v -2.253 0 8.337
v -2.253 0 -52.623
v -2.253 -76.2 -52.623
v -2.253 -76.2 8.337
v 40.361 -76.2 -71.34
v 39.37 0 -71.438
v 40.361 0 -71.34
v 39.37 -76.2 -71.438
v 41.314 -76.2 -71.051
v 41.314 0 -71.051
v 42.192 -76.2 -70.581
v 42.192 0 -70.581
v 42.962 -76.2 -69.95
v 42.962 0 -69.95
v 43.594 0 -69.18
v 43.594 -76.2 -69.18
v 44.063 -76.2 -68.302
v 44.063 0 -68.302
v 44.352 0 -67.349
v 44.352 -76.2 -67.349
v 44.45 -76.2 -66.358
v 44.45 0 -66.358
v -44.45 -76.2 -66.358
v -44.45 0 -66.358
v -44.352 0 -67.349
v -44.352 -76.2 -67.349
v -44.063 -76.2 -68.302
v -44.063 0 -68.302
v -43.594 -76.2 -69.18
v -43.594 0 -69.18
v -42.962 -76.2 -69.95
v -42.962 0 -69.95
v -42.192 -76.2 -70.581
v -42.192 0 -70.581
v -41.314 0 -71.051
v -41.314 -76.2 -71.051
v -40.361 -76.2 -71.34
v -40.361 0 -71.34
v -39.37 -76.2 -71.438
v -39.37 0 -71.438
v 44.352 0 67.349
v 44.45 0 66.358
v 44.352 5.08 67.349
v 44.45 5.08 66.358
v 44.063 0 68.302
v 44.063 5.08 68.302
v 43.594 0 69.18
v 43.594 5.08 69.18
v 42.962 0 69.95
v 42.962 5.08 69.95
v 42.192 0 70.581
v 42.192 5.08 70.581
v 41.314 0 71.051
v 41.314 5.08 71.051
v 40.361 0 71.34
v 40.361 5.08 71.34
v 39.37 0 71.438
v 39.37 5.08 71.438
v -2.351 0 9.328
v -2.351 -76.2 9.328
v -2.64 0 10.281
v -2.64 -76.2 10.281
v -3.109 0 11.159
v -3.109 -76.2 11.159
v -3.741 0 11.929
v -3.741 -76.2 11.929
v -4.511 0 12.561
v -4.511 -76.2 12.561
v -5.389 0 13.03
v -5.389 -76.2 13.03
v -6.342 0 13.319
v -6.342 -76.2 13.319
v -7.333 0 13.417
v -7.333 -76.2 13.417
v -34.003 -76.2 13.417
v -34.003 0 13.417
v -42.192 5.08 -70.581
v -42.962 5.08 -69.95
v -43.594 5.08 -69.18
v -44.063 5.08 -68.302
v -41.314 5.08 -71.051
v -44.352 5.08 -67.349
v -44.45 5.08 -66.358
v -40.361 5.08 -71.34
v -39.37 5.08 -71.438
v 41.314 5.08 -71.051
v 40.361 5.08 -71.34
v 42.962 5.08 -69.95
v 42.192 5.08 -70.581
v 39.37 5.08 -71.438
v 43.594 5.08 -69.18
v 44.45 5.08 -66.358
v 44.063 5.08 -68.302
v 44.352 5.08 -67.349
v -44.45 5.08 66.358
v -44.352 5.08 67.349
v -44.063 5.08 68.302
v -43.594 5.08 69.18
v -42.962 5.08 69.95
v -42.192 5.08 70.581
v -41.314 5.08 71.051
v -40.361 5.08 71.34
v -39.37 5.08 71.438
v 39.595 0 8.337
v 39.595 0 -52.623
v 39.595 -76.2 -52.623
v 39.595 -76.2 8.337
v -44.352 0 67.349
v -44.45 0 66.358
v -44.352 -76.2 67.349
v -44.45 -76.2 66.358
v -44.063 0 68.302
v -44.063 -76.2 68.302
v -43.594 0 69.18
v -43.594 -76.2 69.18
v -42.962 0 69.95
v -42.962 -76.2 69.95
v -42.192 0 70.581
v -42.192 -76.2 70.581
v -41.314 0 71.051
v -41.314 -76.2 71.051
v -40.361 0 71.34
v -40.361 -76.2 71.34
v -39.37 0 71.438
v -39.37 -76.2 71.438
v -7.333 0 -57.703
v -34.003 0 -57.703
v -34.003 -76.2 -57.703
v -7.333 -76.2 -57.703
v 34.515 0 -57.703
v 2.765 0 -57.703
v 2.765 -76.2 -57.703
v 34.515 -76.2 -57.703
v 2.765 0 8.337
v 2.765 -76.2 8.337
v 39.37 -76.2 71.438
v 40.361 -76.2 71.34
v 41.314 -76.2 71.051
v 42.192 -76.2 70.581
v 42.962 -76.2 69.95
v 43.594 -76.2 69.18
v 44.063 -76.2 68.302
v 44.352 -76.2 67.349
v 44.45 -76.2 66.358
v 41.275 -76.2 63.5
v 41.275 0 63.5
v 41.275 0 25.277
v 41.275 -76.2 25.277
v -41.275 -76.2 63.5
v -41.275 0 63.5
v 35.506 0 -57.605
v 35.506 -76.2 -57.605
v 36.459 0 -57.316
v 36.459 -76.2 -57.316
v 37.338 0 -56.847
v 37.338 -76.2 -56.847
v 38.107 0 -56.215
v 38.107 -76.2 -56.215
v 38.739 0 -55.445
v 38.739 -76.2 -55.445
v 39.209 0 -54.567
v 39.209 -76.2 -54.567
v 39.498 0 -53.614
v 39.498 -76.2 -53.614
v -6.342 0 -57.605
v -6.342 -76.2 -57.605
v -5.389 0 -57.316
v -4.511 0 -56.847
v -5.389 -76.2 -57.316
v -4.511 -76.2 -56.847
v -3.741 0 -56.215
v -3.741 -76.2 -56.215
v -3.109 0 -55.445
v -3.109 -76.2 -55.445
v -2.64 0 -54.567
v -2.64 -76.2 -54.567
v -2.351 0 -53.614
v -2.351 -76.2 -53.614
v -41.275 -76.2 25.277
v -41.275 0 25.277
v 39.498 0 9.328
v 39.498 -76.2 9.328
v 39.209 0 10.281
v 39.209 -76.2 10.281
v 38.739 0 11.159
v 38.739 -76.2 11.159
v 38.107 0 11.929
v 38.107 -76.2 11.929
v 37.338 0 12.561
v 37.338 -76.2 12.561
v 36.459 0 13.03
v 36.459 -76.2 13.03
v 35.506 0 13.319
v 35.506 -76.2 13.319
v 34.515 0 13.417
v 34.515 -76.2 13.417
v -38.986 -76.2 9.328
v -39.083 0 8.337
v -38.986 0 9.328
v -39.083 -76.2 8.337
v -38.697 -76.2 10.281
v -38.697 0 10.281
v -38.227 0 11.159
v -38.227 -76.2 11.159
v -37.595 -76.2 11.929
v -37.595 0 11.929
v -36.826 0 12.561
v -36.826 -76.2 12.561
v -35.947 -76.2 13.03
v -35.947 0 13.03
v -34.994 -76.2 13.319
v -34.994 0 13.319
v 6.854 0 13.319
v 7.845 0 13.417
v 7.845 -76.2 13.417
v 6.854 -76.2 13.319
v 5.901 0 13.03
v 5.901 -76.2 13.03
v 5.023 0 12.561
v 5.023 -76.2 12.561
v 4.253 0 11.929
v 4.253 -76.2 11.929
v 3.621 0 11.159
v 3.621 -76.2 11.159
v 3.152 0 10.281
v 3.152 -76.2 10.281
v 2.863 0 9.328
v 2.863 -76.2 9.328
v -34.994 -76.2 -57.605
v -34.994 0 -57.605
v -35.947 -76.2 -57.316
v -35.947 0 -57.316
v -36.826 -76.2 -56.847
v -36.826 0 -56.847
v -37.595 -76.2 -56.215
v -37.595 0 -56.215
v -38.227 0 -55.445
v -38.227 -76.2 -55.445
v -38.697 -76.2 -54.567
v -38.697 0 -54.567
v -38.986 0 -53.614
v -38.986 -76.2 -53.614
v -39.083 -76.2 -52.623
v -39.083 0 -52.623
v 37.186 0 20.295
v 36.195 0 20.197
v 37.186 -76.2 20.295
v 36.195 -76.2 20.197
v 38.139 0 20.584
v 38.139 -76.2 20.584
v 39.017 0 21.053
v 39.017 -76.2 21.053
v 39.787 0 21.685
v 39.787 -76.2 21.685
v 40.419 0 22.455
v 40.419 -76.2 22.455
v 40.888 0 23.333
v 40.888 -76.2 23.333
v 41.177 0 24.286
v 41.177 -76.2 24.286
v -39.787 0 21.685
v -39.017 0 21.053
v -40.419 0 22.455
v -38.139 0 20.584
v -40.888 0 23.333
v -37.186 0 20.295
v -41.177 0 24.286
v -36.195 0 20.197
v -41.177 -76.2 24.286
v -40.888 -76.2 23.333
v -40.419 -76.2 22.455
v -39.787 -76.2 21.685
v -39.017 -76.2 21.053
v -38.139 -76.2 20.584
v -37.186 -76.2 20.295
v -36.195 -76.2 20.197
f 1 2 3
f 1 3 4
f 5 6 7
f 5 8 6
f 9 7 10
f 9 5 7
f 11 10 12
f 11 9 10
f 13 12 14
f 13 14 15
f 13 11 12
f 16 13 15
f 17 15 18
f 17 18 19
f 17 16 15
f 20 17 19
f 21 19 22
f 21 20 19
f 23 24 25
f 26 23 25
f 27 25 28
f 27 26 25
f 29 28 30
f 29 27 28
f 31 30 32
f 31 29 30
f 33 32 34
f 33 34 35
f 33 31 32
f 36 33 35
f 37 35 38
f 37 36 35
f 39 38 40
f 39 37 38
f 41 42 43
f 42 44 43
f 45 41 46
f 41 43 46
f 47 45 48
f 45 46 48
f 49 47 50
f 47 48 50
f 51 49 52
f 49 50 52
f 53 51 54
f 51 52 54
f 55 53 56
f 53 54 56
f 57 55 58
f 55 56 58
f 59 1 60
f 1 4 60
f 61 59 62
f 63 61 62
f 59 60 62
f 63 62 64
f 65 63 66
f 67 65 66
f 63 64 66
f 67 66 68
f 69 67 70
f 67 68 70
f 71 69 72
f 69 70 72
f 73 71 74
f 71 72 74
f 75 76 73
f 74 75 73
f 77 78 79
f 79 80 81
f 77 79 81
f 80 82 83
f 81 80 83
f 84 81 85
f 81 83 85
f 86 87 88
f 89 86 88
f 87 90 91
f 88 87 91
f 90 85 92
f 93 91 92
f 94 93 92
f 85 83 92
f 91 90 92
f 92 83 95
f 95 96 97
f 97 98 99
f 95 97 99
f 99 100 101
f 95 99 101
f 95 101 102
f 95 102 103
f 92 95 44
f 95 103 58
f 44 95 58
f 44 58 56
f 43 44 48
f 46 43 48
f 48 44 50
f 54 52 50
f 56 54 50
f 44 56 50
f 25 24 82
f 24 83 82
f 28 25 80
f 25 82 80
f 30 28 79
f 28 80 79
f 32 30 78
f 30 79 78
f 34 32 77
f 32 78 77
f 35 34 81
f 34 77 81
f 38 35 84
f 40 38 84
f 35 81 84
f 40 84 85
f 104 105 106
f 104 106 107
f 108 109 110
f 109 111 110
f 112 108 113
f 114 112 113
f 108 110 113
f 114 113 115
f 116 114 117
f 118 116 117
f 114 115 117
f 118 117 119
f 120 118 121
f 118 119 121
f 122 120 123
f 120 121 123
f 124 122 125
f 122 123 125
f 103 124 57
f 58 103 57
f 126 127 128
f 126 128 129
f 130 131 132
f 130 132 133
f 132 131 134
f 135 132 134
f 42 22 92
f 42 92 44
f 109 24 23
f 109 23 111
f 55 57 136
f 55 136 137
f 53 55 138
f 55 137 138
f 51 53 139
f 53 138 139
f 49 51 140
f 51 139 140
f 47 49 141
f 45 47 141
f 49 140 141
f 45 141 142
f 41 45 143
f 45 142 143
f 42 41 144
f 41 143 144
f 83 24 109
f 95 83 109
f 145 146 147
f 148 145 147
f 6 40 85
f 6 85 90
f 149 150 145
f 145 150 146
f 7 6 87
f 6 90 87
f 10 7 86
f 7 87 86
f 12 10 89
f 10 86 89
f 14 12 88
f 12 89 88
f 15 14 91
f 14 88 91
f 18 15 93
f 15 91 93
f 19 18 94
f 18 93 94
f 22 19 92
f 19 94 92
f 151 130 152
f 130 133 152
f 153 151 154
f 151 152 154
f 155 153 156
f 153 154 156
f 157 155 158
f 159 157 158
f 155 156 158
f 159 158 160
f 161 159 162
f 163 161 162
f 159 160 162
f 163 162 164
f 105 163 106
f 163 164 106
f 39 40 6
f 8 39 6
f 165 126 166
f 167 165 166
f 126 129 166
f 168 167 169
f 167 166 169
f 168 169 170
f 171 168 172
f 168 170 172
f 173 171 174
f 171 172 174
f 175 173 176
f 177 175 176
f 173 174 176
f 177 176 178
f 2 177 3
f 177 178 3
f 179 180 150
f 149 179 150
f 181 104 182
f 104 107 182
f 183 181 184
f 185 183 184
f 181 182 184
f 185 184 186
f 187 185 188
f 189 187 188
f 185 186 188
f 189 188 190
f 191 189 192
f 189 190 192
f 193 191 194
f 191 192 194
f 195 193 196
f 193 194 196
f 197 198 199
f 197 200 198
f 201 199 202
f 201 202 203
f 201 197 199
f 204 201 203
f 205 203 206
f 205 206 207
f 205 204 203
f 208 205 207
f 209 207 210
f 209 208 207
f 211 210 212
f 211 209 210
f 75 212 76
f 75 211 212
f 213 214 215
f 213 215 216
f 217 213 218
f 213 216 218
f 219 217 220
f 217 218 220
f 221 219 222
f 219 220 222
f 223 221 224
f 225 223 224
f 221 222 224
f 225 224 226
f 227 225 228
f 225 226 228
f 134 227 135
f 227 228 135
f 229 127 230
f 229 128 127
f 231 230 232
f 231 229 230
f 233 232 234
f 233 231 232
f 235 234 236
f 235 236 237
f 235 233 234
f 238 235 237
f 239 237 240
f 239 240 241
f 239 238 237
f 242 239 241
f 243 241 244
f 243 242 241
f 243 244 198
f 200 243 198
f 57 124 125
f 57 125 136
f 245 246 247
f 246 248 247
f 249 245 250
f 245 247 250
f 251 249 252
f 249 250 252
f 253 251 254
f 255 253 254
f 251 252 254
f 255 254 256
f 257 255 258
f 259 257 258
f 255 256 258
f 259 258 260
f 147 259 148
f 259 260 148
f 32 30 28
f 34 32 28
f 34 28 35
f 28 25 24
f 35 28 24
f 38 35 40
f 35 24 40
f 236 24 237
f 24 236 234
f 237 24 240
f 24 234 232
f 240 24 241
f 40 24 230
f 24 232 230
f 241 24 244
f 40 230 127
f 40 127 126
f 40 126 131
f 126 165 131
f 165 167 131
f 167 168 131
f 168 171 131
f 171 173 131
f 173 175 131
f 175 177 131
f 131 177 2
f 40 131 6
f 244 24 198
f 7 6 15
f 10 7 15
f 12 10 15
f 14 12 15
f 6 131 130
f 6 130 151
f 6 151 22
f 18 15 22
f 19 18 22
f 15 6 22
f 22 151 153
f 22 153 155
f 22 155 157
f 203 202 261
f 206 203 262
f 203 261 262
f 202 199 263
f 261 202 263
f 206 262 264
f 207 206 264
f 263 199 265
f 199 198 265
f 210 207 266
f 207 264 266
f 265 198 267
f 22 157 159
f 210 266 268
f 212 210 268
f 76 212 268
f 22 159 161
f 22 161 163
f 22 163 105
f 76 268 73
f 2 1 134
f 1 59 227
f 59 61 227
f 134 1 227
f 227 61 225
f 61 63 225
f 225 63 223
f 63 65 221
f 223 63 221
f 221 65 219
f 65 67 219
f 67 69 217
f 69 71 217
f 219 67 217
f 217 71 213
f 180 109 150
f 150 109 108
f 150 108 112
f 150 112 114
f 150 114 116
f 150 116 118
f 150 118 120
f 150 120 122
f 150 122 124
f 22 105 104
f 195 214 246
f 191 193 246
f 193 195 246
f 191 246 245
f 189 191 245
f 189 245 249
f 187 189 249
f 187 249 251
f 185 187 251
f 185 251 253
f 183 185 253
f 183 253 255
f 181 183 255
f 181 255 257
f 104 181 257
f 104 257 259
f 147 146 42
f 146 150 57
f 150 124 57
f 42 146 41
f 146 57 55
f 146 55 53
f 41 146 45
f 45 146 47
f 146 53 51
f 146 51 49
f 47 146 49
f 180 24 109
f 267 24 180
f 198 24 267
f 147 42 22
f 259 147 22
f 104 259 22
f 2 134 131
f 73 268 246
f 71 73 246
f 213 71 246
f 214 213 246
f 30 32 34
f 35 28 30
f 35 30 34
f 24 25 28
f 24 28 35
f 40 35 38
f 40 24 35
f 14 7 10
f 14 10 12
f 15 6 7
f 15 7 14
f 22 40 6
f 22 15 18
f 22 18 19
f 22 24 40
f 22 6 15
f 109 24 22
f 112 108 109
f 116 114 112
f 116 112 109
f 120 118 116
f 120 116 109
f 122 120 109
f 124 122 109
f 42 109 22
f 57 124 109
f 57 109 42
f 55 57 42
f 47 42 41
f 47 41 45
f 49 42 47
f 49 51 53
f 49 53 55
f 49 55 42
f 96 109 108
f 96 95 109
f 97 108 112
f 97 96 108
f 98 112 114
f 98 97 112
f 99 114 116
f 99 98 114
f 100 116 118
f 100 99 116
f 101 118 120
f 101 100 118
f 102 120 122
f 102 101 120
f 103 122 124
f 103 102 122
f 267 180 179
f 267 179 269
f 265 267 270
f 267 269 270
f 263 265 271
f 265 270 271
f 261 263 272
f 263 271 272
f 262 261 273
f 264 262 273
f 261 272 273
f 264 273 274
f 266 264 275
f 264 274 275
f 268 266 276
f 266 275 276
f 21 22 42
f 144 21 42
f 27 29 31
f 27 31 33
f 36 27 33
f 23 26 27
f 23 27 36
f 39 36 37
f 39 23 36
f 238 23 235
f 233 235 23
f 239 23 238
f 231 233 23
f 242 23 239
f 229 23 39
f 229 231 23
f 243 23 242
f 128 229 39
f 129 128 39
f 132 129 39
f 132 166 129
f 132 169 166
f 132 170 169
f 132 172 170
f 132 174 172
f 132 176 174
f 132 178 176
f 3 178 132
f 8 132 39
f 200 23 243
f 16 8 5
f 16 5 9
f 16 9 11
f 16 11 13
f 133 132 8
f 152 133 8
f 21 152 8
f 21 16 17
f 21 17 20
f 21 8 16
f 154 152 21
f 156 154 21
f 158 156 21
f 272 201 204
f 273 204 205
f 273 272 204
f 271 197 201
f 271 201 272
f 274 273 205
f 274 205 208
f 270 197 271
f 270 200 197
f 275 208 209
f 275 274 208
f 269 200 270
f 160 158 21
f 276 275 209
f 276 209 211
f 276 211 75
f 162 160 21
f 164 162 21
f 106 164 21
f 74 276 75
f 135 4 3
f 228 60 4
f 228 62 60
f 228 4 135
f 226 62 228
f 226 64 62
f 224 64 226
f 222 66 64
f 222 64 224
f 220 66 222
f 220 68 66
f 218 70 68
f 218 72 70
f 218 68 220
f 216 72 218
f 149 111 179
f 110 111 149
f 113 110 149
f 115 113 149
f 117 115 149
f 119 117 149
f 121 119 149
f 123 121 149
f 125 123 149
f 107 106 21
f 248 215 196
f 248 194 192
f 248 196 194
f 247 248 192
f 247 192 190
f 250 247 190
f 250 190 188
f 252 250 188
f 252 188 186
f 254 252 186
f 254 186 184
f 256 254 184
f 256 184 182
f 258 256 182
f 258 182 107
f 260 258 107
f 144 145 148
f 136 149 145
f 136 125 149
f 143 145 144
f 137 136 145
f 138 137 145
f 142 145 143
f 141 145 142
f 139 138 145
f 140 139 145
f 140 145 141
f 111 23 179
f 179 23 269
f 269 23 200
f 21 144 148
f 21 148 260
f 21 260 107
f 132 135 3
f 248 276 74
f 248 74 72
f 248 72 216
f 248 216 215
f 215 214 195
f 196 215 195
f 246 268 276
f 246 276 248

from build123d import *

# Parameters (mm, degrees)
F0_W     = 88.9
F0_H     = 142.875
F0_W_2   = 82.55
F0_H_2   = 83.6971029639
F0_W_3   = 36.83
F0_H_3   = 71.12
F1_DEPTH = 76.2
F2_R     = 5.08
F0_H_4   = 43.3028970361
F3_DEPTH = 5.08
F4_R     = 5.08


with BuildPart() as f1:
    # F0 (on Front) → F1 (new body)
    with BuildSketch(Plane.XZ):
        Rectangle(F0_W, F0_H)
        Polygon((-41.275, 20.1971029639), (-41.275, 63.5), (41.275, 63.5), (41.275, 20.1971029639), (41.275, -63.5), (-41.275, -63.5), align=None, mode=Mode.SUBTRACT)
        with Locations((0, -21.651448518)):
            Rectangle(F0_W_2, F0_H_2)
        with Locations((-20.6682275152, -22.143062892)):
            Rectangle(F0_W_3, F0_H_3, mode=Mode.SUBTRACT)
        with Locations((21.1803221041, -22.143062892)):
            Rectangle(F0_W_3, F0_H_3, mode=Mode.SUBTRACT)
    extrude(amount=F1_DEPTH)

    # F2
    f2_edges = [f1.edges().sort_by_distance(p)[0] for p in [
        (44.45, -38.1, 71.4375),
        (-44.45, -38.1, 71.4375),
        (41.275, -38.1, 20.197103),
        (-41.275, -38.1, 20.197103),
        (-39.083228, -38.1, -57.703063),
        (39.595322, -38.1, -57.703063),
        (-2.253228, -38.1, -57.703063),
        (-39.083228, -38.1, 13.416937),
        (2.765322, -38.1, 13.416937),
        (39.595322, -38.1, 13.416937),
        (-2.253228, -38.1, 13.416937),
        (44.45, -38.1, -71.4375),
        (-44.45, -38.1, -71.4375),
    ]]
    fillet(f2_edges, radius=F2_R)


with BuildPart() as f3:
    # F0 (on Front) → F3 (new body)
    with BuildSketch(Plane.XZ):
        Rectangle(F0_W, F0_H)
        Polygon((-41.275, 20.1971029639), (-41.275, 63.5), (41.275, 63.5), (41.275, 20.1971029639), (41.275, -63.5), (-41.275, -63.5), align=None, mode=Mode.SUBTRACT)
        with Locations((0, -21.651448518)):
            Rectangle(F0_W_2, F0_H_2)
        with Locations((-20.6682275152, -22.143062892)):
            Rectangle(F0_W_3, F0_H_3, mode=Mode.SUBTRACT)
        with Locations((21.1803221041, -22.143062892)):
            Rectangle(F0_W_3, F0_H_3, mode=Mode.SUBTRACT)
        with Locations((0, 41.848551482)):
            Rectangle(F0_W_2, F0_H_4)
        with Locations((21.1803221041, -22.143062892)):
            Rectangle(F0_W_3, F0_H_3)
        with Locations((-20.6682275152, -22.143062892)):
            Rectangle(F0_W_3, F0_H_3)
    extrude(amount=-F3_DEPTH)

    # F4
    f4_edges = [f3.edges().sort_by_distance(p)[0] for p in [
        (44.45, 2.54, 71.4375),
        (-44.45, 2.54, 71.4375),
        (44.45, 2.54, -71.4375),
        (-44.45, 2.54, -71.4375),
    ]]
    fillet(f4_edges, radius=F4_R)


solid = Compound([f1.part, f3.part])
